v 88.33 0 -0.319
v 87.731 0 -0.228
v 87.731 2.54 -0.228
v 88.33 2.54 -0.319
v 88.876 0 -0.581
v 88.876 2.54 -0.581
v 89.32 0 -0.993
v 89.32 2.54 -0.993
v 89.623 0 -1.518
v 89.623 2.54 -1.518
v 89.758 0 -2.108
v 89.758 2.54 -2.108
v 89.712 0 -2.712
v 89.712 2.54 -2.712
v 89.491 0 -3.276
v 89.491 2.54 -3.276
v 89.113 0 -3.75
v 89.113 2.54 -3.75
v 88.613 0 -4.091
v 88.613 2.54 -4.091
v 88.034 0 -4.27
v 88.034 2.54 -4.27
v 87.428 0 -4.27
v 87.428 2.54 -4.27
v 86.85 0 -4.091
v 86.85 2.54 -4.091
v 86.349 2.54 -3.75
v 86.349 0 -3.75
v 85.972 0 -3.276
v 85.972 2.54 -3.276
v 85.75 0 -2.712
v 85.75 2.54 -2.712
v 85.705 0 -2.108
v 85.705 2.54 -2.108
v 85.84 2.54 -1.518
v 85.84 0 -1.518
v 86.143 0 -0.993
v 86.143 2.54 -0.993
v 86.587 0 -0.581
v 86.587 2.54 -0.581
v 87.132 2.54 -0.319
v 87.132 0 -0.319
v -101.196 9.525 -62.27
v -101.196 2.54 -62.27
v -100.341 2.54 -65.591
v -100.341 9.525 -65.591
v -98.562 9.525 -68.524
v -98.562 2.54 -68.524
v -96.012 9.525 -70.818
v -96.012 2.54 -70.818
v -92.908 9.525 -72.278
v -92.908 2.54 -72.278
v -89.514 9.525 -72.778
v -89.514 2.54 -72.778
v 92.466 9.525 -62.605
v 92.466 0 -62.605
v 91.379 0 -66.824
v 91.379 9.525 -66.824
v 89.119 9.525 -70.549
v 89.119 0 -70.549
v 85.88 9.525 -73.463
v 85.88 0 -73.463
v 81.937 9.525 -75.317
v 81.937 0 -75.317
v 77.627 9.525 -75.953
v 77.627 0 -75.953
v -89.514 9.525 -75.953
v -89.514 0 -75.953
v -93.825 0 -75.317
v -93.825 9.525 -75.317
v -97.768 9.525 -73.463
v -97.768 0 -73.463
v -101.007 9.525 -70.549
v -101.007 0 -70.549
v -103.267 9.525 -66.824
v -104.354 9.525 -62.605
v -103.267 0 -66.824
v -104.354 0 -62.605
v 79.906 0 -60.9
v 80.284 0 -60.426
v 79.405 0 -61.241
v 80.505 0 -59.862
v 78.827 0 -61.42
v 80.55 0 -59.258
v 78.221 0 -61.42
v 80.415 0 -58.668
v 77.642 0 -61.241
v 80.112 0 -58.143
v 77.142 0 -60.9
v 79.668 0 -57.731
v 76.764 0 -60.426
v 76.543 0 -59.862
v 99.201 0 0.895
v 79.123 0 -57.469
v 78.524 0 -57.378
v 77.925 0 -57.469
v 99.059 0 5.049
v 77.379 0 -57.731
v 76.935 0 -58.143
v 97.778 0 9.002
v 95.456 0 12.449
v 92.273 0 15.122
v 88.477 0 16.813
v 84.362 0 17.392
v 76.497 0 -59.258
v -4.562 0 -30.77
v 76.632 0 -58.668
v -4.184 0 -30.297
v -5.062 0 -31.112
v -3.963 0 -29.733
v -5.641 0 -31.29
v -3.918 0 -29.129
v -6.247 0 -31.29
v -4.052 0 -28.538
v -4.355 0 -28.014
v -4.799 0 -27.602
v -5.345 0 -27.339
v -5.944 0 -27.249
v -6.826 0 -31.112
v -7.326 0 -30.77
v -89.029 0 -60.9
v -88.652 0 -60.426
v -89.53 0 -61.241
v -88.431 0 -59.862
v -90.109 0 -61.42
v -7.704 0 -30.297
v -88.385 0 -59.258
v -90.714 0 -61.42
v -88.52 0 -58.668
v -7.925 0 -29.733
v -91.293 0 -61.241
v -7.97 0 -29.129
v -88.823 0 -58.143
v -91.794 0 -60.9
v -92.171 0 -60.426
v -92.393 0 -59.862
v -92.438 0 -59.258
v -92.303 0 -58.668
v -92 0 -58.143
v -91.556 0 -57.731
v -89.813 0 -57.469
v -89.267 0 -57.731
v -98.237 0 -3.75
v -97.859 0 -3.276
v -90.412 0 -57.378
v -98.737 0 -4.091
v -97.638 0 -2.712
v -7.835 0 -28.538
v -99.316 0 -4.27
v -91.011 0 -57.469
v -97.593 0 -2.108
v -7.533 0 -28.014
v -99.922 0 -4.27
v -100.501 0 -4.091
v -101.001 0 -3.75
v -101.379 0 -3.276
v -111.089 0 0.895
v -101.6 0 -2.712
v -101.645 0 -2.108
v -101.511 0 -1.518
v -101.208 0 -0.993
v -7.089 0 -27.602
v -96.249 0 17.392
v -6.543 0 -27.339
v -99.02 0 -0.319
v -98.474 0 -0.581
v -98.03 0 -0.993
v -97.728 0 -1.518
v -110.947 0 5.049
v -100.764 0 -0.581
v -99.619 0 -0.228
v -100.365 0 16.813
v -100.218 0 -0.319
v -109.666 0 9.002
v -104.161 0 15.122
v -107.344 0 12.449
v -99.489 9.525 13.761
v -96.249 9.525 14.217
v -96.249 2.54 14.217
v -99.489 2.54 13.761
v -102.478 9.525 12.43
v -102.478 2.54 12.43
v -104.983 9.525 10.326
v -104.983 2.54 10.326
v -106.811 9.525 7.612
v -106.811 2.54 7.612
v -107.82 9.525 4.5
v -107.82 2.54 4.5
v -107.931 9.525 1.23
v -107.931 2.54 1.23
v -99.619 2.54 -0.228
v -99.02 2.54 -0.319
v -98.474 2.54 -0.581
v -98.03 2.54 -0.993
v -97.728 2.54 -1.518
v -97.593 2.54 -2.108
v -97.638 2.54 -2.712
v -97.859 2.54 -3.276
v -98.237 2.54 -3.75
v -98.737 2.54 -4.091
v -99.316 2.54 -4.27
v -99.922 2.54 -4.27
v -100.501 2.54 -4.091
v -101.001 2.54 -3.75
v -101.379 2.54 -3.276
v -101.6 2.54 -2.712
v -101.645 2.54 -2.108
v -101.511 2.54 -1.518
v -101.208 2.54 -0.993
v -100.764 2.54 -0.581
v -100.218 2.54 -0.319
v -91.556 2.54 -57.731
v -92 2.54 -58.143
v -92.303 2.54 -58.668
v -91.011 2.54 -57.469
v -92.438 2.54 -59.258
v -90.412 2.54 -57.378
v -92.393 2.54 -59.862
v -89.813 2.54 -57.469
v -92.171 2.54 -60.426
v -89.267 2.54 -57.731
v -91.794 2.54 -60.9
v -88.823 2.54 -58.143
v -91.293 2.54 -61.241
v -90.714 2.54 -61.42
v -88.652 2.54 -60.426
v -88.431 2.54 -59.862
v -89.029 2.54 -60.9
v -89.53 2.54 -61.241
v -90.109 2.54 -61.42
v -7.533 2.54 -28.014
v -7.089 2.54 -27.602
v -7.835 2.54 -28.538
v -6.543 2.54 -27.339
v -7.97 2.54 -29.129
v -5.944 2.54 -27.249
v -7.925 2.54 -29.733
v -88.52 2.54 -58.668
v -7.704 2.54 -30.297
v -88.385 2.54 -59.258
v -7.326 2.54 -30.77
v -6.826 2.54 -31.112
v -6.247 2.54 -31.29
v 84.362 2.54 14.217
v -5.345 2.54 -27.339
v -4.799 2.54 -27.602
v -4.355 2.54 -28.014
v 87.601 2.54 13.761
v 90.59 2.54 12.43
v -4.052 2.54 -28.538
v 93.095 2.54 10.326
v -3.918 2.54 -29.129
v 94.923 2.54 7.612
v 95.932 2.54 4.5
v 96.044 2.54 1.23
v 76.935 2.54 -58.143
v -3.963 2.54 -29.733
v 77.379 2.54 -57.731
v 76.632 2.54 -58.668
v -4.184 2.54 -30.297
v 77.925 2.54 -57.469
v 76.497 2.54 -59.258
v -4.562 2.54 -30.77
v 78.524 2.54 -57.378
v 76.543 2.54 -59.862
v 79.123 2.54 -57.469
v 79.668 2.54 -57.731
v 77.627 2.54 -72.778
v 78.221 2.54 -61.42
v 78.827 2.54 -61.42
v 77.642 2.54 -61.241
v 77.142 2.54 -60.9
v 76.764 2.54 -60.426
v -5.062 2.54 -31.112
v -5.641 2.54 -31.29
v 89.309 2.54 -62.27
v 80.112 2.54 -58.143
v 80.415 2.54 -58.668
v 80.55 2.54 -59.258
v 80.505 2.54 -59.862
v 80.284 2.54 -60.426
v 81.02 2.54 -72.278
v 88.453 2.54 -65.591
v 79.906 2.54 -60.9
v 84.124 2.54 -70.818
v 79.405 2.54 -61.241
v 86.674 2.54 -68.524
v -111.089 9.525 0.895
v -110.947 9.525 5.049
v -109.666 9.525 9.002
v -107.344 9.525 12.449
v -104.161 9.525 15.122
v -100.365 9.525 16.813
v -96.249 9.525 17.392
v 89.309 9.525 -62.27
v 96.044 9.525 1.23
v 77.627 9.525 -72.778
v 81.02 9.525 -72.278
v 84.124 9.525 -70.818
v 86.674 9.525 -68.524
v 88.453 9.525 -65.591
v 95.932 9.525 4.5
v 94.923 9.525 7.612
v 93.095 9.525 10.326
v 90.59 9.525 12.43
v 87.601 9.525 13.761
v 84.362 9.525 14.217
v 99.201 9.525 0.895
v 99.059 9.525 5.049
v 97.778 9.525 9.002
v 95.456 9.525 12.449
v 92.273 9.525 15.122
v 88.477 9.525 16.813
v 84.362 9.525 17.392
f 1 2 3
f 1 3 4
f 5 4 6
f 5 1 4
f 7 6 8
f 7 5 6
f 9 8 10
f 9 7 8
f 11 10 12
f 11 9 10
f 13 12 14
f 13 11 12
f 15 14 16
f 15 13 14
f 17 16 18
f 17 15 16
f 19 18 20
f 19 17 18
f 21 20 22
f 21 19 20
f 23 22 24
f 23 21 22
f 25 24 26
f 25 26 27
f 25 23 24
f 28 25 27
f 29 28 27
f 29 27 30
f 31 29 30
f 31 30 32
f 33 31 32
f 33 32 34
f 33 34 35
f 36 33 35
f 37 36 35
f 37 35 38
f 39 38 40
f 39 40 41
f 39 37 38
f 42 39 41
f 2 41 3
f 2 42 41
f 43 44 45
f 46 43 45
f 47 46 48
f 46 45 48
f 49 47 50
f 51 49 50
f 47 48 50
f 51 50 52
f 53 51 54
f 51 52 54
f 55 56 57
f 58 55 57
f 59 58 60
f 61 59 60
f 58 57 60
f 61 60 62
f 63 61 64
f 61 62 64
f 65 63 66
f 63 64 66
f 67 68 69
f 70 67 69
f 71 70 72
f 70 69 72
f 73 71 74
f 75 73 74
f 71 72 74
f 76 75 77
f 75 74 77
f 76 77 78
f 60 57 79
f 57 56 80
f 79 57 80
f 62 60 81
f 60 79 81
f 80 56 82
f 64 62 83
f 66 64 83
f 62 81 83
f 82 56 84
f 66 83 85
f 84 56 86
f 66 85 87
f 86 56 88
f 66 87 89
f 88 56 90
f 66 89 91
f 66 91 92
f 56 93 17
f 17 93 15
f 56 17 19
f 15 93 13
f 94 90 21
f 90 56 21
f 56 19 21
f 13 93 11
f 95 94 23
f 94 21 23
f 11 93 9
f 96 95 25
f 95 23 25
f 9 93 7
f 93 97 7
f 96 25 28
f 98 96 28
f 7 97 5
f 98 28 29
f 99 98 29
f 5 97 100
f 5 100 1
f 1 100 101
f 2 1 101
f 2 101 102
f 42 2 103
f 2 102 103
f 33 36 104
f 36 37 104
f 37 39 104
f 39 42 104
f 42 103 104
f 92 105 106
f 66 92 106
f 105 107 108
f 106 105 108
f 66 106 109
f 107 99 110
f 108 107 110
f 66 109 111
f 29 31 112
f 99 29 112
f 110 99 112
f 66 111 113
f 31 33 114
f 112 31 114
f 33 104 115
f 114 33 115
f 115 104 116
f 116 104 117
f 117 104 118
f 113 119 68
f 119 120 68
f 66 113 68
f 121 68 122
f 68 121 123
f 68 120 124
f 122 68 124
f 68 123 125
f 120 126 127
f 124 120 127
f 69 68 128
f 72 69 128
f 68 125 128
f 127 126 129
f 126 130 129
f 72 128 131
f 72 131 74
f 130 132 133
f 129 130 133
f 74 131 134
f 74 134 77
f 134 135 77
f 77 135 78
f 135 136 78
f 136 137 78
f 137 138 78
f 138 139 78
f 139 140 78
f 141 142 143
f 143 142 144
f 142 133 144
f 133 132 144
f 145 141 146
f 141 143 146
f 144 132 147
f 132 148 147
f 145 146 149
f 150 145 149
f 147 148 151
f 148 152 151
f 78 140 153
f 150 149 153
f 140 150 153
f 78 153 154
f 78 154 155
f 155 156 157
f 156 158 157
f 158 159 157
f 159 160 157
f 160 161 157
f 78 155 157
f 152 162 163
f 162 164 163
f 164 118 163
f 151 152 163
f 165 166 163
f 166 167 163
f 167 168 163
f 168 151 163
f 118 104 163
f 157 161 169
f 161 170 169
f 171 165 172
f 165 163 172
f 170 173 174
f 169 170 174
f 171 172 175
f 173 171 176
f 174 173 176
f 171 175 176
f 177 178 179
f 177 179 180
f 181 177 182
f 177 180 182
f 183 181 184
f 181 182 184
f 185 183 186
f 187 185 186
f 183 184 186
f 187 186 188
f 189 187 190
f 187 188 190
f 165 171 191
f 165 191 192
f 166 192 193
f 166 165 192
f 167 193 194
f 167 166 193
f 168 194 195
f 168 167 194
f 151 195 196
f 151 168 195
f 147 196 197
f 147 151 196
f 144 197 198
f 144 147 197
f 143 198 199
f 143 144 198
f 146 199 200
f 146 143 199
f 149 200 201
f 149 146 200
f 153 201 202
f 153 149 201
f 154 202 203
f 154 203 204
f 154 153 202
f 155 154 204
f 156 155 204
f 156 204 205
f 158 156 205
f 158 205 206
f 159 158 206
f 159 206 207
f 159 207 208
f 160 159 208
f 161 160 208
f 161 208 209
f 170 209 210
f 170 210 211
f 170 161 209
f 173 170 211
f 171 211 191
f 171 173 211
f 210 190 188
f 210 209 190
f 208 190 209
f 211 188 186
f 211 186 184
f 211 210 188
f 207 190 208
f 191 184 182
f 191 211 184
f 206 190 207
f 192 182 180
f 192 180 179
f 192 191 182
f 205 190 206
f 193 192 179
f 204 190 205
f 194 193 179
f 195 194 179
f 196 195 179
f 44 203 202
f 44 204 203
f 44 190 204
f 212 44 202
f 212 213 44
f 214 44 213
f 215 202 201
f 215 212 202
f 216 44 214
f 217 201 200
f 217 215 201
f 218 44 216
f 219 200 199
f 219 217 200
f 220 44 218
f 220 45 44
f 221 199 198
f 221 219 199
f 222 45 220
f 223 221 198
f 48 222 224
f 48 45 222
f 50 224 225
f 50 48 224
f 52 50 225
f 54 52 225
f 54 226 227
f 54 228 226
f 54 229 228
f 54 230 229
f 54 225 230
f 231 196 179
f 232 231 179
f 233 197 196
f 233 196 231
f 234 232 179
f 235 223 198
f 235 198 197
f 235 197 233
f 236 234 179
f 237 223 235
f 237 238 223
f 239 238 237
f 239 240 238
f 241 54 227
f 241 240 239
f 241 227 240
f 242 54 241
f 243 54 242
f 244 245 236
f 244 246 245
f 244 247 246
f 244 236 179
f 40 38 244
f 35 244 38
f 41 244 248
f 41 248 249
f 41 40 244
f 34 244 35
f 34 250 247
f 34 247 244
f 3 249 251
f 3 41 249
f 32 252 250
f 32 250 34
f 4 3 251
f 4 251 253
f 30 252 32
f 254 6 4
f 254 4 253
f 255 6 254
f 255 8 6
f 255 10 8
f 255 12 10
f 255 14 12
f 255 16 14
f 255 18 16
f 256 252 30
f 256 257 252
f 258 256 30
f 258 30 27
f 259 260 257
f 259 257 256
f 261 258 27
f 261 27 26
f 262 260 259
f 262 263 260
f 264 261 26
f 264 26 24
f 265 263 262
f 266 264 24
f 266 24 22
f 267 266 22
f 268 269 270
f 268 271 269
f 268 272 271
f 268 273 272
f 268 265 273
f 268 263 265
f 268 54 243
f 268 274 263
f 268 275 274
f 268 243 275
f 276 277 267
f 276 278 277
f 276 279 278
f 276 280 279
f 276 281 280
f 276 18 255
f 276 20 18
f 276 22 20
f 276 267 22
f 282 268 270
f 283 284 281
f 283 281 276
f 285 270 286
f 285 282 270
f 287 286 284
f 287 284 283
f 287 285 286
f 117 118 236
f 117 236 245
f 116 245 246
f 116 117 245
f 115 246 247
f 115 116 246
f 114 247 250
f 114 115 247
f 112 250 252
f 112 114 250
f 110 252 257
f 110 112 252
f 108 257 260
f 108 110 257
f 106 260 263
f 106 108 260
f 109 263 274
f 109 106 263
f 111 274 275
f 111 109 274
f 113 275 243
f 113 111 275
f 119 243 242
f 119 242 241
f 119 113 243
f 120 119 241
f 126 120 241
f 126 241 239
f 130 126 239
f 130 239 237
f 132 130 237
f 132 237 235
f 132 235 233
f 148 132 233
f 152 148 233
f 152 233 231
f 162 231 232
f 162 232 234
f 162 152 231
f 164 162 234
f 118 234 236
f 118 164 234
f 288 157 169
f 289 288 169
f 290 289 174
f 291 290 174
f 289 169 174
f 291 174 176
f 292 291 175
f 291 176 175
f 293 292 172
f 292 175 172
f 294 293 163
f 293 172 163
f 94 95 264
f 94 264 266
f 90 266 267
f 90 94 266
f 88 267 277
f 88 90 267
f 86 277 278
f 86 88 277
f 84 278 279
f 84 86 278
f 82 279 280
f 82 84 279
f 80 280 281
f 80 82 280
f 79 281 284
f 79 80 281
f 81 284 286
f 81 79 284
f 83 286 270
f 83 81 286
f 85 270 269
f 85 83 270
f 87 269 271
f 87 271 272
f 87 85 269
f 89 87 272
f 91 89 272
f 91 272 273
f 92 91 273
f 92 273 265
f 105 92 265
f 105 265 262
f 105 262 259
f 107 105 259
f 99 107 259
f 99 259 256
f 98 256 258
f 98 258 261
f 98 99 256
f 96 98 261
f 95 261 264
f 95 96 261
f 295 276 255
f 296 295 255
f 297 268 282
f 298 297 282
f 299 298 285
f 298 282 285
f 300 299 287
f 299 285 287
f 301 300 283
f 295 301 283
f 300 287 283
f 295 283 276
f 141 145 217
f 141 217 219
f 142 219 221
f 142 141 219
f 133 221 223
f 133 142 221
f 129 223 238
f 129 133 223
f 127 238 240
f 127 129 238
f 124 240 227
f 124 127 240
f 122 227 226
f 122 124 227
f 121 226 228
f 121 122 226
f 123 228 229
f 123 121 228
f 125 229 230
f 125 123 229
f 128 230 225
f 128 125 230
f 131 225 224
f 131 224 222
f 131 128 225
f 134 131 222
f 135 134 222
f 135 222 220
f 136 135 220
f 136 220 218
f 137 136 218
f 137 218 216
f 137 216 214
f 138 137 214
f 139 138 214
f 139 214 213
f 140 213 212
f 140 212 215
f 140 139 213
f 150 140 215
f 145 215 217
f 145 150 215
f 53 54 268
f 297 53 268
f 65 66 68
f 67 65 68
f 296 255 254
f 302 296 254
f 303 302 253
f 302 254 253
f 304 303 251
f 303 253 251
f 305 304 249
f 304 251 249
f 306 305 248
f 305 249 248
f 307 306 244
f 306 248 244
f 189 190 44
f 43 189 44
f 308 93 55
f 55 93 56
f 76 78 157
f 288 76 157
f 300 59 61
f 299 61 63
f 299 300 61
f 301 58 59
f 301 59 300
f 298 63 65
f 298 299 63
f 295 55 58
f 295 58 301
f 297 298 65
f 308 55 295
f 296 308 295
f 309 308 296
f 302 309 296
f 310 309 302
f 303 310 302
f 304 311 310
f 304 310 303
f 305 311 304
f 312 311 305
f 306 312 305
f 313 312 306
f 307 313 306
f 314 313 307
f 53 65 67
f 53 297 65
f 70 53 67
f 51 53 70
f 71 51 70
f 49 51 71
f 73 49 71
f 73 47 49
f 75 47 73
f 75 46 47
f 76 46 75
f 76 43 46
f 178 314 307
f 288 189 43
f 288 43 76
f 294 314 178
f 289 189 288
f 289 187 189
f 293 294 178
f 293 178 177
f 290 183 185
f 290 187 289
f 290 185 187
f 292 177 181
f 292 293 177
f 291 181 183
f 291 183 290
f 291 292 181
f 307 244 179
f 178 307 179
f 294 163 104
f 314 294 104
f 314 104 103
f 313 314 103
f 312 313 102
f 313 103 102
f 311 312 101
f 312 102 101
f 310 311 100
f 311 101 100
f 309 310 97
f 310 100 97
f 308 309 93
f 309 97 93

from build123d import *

# Parameters (mm, degrees)
SKETCH1_R           = 2.032
BOSS_EXTRUDE1_DEPTH = 2.54
BOSS_EXTRUDE2_DEPTH = 9.525


with BuildPart() as part:
    # Sketch1 → Boss-Extrude1 (new body)
    with BuildSketch(Plane(origin=(0, 0, 0), x_dir=(1, 0, 0), z_dir=(0, 1, 0))):
        with BuildLine():
            Line((-101.196460125, 62.269846472), (-107.93130861, -1.230153528))
            ThreePointArc((-107.93130861, -1.230153528), (-104.983139546, -10.325633674), (-96.249329296, -14.216651334))
            Line((-96.249329296, -14.216651334), (84.361550459, -14.216651334))
            ThreePointArc((84.361550459, -14.216651334), (93.095360709, -10.325633674), (96.043529773, -1.230153528))
            Line((96.043529773, -1.230153528), (89.308681288, 62.269846472))
            ThreePointArc((89.308681288, 62.269846472), (85.483184315, 69.764658916), (77.626701974, 72.778348666))
            Line((77.626701974, 72.778348666), (-89.514480811, 72.778348666))
            ThreePointArc((-89.514480811, 72.778348666), (-97.370963151, 69.764658916), (-101.196460125, 62.269846472))
        make_face()
        with Locations(Location((78.523810582, 59.410328666, 0), (0, 0, 270))):
            Circle(SKETCH1_R, mode=Mode.SUBTRACT)
        with Locations(Location((87.731310582, 2.260328666, 0), (0, 0, 270))):
            Circle(SKETCH1_R, mode=Mode.SUBTRACT)
        with Locations(Location((-5.943889418, 29.280848666, 0), (0, 0, 270))):
            Circle(SKETCH1_R, mode=Mode.SUBTRACT)
        with Locations(Location((-99.619089418, 2.260328666, 0), (0, 0, 270))):
            Circle(SKETCH1_R, mode=Mode.SUBTRACT)
        with Locations(Location((-90.411589418, 59.410328666, 0), (0, 0, 270))):
            Circle(SKETCH1_R, mode=Mode.SUBTRACT)
    extrude(amount=BOSS_EXTRUDE1_DEPTH)

    # Sketch4 → Boss-Extrude2 (add)
    with BuildSketch(Plane.XZ):
        with BuildLine():
            Line((99.200821479, 0.895289256), (92.465972995, -62.604710744))
            ThreePointArc((92.465972995, -62.604710744), (87.60655792, -72.125148173), (77.626701974, -75.953348666))
            Line((77.626701974, -75.953348666), (-89.514480811, -75.953348666))
            ThreePointArc((-89.514480811, -75.953348666), (-99.494336757, -72.125148173), (-104.353751831, -62.604710744))
            Line((-104.353751831, -62.604710744), (-111.088600316, 0.895289256))
            ThreePointArc((-111.088600316, 0.895289256), (-107.343628803, 12.44900728), (-96.249329296, 17.391651334))
            Line((-96.249329296, 17.391651334), (84.361550459, 17.391651334))
            ThreePointArc((84.361550459, 17.391651334), (95.455849966, 12.44900728), (99.200821479, 0.895289256))
        make_face()
        with BuildLine():
            ThreePointArc((-101.196460125, -62.269846472), (-97.370963151, -69.764658916), (-89.514480811, -72.778348666))
            Line((-89.514480811, -72.778348666), (77.626701974, -72.778348666))
            ThreePointArc((77.626701974, -72.778348666), (85.483184315, -69.764658916), (89.308681288, -62.269846472))
            Line((89.308681288, -62.269846472), (96.043529773, 1.230153528))
            ThreePointArc((96.043529773, 1.230153528), (93.095360709, 10.325633674), (84.361550459, 14.216651334))
            Line((84.361550459, 14.216651334), (-96.249329296, 14.216651334))
            ThreePointArc((-96.249329296, 14.216651334), (-104.983139546, 10.325633674), (-107.93130861, 1.230153528))
            Line((-107.93130861, 1.230153528), (-101.196460125, -62.269846472))
        make_face(mode=Mode.SUBTRACT)
    extrude(amount=-BOSS_EXTRUDE2_DEPTH)


solid = part.part
